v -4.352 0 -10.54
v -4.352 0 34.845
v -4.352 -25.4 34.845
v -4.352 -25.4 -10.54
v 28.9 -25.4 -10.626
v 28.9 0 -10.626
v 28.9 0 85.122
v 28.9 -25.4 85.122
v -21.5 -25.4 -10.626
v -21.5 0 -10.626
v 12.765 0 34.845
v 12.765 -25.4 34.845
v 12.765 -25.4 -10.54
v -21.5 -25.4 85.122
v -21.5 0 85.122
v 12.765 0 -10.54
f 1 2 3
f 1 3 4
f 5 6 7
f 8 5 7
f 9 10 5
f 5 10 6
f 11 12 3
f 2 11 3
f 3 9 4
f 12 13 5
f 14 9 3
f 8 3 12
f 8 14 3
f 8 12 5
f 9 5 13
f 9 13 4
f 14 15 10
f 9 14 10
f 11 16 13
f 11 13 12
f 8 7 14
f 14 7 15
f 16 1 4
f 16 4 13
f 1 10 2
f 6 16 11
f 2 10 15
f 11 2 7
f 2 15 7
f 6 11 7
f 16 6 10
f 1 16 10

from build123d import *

# Parameters (mm, degrees)
F0_W      = 36.8749946356
F0_H      = 46.3530421257
F1_DEPTH  = 43.4907004237
F4_DEPTH  = 25.4
F4_FACE_W = 50.4002720118
F4_FACE_H = 95.7473944873
F6_DEPTH  = 80.4695729166


with BuildPart() as f1:
    # F0 (on Top) → F1 (new body)
    with BuildSketch(Plane.XY):
        with Locations((18.4374973178, -11.0187307)):
            Rectangle(F0_W, F0_H)
    extrude(amount=F1_DEPTH)


with BuildPart() as f4:
    # F3 (on Front) → F4 (new body)
    with BuildSketch(Plane.XZ):
        Polygon((-21.5003099293, 85.1215198636), (-21.5003099293, 46.1357757449), (-21.5003099293, -10.6258746237), (28.8999620825, -10.6258746237), (28.8999620825, 85.1215198636), align=None)
    extrude(amount=F4_DEPTH)

    # F4_face (on face) + F5 (on Front) → F6 (cut)
    with BuildSketch(Plane(origin=(3.6998260766, -25.4, 37.24782262), x_dir=(1, 0, 0), z_dir=(0, -1, 0))):
        Rectangle(F4_FACE_W, F4_FACE_H)
    with BuildSketch(Plane.XZ):
        Polygon((-4.3523218483, 0), (-4.3523218483, -10.5397570878), (12.7652771771, -10.5397570878), (12.7652771771, 34.8452031612), (-4.3523218483, 34.8452031612), align=None)
    extrude(amount=F6_DEPTH, mode=Mode.SUBTRACT)


solid = f4.part
